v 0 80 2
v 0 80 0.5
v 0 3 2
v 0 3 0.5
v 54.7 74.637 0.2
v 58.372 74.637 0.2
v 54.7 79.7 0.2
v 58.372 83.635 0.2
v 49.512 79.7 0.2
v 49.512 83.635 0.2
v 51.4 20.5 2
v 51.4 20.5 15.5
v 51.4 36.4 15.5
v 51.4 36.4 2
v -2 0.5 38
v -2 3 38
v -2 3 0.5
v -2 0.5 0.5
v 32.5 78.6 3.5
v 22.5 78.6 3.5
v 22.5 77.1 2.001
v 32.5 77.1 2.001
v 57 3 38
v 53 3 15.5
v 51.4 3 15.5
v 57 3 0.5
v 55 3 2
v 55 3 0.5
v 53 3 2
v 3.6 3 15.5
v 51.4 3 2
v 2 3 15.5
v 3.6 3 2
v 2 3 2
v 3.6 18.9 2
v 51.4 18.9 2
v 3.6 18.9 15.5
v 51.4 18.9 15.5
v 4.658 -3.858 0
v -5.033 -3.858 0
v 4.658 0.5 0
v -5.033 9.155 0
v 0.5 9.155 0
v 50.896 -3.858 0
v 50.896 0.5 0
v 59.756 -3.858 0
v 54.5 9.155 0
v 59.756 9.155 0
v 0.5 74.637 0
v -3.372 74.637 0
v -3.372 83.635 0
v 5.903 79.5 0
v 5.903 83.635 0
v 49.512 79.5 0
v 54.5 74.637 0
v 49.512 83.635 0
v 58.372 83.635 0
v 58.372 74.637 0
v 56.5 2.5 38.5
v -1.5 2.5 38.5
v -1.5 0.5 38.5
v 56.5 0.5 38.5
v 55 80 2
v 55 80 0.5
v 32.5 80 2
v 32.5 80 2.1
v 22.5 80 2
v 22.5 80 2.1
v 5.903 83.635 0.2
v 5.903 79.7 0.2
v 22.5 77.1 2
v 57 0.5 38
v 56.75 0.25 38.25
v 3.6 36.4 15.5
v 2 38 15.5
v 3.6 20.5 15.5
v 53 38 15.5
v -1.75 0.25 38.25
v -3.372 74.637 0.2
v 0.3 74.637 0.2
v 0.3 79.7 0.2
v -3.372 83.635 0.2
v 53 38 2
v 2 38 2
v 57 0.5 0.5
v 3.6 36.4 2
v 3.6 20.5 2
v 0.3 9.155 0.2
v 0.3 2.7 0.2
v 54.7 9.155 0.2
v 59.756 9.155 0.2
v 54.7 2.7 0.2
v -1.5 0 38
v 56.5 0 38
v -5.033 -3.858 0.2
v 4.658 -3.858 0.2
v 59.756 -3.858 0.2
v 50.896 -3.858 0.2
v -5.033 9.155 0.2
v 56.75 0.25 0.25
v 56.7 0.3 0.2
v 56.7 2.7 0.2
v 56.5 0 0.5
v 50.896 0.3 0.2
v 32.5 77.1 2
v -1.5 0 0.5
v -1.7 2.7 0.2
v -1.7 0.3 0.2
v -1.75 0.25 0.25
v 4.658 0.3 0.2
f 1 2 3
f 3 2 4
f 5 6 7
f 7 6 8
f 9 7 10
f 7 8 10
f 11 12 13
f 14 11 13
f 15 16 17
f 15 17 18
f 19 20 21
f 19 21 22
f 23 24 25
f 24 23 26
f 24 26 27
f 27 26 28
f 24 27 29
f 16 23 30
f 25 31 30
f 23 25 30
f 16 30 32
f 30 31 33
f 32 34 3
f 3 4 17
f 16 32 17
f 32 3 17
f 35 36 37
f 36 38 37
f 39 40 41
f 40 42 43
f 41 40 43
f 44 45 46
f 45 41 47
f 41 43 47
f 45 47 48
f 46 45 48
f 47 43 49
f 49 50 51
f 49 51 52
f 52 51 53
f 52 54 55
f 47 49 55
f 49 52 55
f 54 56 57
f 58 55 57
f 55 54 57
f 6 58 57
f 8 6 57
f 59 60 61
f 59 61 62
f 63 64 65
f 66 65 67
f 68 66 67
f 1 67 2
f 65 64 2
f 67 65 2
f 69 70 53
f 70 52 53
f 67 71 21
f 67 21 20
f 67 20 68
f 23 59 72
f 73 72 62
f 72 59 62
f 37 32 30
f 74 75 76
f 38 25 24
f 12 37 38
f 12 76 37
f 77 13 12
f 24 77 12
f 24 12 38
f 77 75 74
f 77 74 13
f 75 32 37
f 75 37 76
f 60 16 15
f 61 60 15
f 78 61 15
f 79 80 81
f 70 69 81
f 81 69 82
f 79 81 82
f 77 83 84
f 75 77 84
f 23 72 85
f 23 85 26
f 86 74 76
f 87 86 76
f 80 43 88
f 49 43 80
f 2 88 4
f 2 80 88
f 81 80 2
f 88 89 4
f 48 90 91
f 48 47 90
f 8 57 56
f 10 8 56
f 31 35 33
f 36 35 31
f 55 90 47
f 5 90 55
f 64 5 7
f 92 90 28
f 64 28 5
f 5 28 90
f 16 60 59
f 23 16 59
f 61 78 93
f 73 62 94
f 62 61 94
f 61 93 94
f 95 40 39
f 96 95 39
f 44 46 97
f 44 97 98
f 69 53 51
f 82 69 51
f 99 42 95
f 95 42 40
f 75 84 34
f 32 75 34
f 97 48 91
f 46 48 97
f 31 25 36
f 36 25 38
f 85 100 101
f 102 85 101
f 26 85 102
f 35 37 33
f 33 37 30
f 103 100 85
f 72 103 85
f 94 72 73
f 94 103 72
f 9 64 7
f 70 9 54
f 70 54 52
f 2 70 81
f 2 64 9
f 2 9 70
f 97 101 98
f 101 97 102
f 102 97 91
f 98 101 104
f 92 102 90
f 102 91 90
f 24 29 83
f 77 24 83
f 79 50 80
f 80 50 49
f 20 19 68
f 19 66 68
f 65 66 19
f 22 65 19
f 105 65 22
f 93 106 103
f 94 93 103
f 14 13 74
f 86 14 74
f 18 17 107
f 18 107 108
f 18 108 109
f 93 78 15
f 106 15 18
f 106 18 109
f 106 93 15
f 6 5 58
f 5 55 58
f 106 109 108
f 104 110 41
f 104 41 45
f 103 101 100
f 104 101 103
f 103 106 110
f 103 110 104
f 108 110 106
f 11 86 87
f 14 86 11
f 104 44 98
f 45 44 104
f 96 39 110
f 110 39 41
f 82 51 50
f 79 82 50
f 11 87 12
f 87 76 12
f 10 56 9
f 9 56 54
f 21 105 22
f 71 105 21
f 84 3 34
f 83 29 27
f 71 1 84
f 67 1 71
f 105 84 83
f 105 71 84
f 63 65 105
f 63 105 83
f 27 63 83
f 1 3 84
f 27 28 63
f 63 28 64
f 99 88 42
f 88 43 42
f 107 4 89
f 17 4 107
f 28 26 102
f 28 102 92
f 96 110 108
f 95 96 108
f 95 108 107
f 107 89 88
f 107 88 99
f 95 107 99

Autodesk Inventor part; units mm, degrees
ref_plane "YZ Plane" through (0, 0, 0) normal (1, 0, 0) x (0, 1, 0)
ref_plane "XZ Plane" through (0, 0, 0) normal (0, 1, 0) x (-1, 0, 0)
ref_plane "XY Plane" through (0, 0, 0) normal (0, 0, 1) x (1, 0, 0)
sketch "Sketch1" plane through (0, 0, 0) normal (0, 0, 1) x (1, 0, 0)
  line L0 (0, 0) -> (55, 0)
  line L1 (55, 0) -> (55, 80)
  line L2 (55, 80) -> (0, 80)
  line L3 (0, 80) -> (0, 0)
  dimension "d0" = 55
  dimension "d1" = 80
extrude "Base" add sketch "Sketch1" along normal blind 2
sketch "Sketch2" plane through (0, 0, 2) normal (0, 0, 1) x (1, 0, 0)
  line L0 (55, 0) -> (55, 80) projected
  line L1 (0, 80) -> (0, 0) projected
  line L2 (-2, 0) -> (57, 0)
  line L3 (57, 0) -> (57, 3)
  line L4 (57, 3) -> (-2, 3)
  line L5 (-2, 3) -> (-2, 0)
  dimension "d4" = 3
  dimension "d5" = 2
  dimension "d6" = 2
extrude "Back" add sketch "Sketch2" along normal blind 36.5 and the other way blind 2
sketch "Sketch6" plane through (0, 0, 2) normal (0, 0, 1) x (1, 0, 0)
  line L0 (0, 80) -> (0, 3) projected
  line L1 (0, 3) -> (55, 3) projected
  line L2 (55, 3) -> (55, 80) projected
  line L3 (2, 3) -> (53, 3)
  line L4 (53, 3) -> (53, 38)
  line L5 (53, 38) -> (2, 38)
  line L6 (2, 38) -> (2, 3)
  point P0 (0, 0)
  dimension "d29" = 35
  dimension "d30" = 2
  dimension "d31" = 2
extrude "Box" add sketch "Sketch6" along normal blind 13.5
chamfer "Chamfer3" distance 0.5 angle 45 8 edges at (0, 41.5, 0) (27.5, 80, 0) (55, 41.5, 0) (-1, 3, 0) (-2, 1.5, 0) (27.5, 0, 0) (57, 1.5, 0) (56, 3, 0)
chamfer "Chamfer4" distance 0.5 angle 45 3 edges at (-2, 0, 19.5) (27.5, 0, 38.5) (57, 0, 19.5)
chamfer "Chamfer5" distance 0.5 angle 45 3 edges at (-2, 1.75, 38.5) (27.5, 3, 38.5) (57, 1.75, 38.5)
sketch "Sketch7" plane through (0, 0, 15.5) normal (0, 0, 1) x (1, 0, 0)
  line L0 (53, 3) -> (2, 3) projected
  line L1 (53, 3) -> (53, 38) projected
  line L2 (53, 38) -> (2, 38) projected
  line L3 (2, 38) -> (2, 3) projected
  line L4 (3.6, 3) -> (51.4, 3)
  line L5 (51.4, 3) -> (51.4, 18.9)
  line L6 (51.4, 18.9) -> (3.6, 18.9)
  line L7 (3.6, 18.9) -> (3.6, 3)
  line L8 (51.4, 36.4) -> (3.6, 36.4)
  line L9 (3.6, 36.4) -> (3.6, 20.5)
  line L10 (3.6, 20.5) -> (51.4, 20.5)
  line L11 (51.4, 20.5) -> (51.4, 36.4)
  point P0 (0, 0)
  dimension "d44" = 1.6
  dimension "d45" = 1.6
  dimension "d46" = 1.6
  dimension "d47" = 1.6
  dimension "d48" = 1.6
  dimension "d49" = 1.6
  dimension "d50" = 15.9
  dimension "d51" = 15.9
extrude "Box inside" cut sketch "Sketch7" against normal blind 13.5 contours L0 L7 L6 L5 | L11 L10 L9 L8
sketch "Sketch8" plane through (0, 0, 2) normal (0, 0, 1) x (1, 0, 0)
  line L0 (55, 3) -> (55, 80) projected
  line L1 (55, 80) -> (0, 80) projected
  line L2 (0, 80) -> (0, 3) projected
  line L3 (22.5, 80) -> (32.5, 80)
  line L4 (32.5, 80) -> (32.5, 77.1)
  line L5 (32.5, 77.1) -> (22.5, 77.1)
  line L6 (22.5, 77.1) -> (22.5, 80)
  point P0 (0, 0)
  dimension "d63" = 22.5
  dimension "d64" = 22.5
  dimension "d65" = 10
  dimension "d66" = 2.9
extrude "Extrusion8" add sketch "Sketch8" along normal blind 1.5
chamfer "Chamfer9" distance 1.5 angle 45 1 edges at (27.5, 77.1, 3.5)
chamfer "Chamfer10" distance 1.4 angle 45 1 edges at (27.5, 80, 3.5)
sketch "Sketch9" plane through (0, 0, 0) normal (0, 0, -1) x (-1, 0, 0)
  line L0 (-58.372, 83.6354) -> (-49.5119, 83.6354)
  line L1 (-49.5119, 83.6354) -> (-49.5119, 74.6368)
  line L2 (-49.5119, 74.6368) -> (-58.372, 74.6368)
  line L3 (-58.372, 74.6368) -> (-58.372, 83.6354)
  line L4 (-5.9034, 83.6354) -> (3.372, 83.6354)
  line L5 (3.372, 83.6354) -> (3.372, 74.6368)
  line L6 (3.372, 74.6368) -> (-5.9034, 74.6368)
  line L7 (-5.9034, 74.6368) -> (-5.9034, 83.6354)
  line L8 (-4.6575, 9.1548) -> (5.0333, 9.1548)
  line L9 (5.0333, 9.1548) -> (5.0333, -3.8585)
  line L10 (5.0333, -3.8585) -> (-4.6575, -3.8585)
  line L11 (-4.6575, -3.8585) -> (-4.6575, 9.1548)
  line L12 (-50.8963, 9.1548) -> (-59.7564, 9.1548)
  line L13 (-59.7564, 9.1548) -> (-59.7564, -3.8585)
  line L14 (-59.7564, -3.8585) -> (-50.8963, -3.8585)
  line L15 (-50.8963, -3.8585) -> (-50.8963, 9.1548)
  point P0 (0, 0)
extrude "printing support" add sketch "Sketch9" against normal blind 0.2
equation "\"d31\" = d30"
equation "\"d45\" = d44"
equation "\"d46\" = d45"
equation "\"d47\" = d46"
equation "\"d48\" = d44"
equation "\"d49\" = d44"
equation "\"d64\" = d63"
properties part number "BOTTOM"
